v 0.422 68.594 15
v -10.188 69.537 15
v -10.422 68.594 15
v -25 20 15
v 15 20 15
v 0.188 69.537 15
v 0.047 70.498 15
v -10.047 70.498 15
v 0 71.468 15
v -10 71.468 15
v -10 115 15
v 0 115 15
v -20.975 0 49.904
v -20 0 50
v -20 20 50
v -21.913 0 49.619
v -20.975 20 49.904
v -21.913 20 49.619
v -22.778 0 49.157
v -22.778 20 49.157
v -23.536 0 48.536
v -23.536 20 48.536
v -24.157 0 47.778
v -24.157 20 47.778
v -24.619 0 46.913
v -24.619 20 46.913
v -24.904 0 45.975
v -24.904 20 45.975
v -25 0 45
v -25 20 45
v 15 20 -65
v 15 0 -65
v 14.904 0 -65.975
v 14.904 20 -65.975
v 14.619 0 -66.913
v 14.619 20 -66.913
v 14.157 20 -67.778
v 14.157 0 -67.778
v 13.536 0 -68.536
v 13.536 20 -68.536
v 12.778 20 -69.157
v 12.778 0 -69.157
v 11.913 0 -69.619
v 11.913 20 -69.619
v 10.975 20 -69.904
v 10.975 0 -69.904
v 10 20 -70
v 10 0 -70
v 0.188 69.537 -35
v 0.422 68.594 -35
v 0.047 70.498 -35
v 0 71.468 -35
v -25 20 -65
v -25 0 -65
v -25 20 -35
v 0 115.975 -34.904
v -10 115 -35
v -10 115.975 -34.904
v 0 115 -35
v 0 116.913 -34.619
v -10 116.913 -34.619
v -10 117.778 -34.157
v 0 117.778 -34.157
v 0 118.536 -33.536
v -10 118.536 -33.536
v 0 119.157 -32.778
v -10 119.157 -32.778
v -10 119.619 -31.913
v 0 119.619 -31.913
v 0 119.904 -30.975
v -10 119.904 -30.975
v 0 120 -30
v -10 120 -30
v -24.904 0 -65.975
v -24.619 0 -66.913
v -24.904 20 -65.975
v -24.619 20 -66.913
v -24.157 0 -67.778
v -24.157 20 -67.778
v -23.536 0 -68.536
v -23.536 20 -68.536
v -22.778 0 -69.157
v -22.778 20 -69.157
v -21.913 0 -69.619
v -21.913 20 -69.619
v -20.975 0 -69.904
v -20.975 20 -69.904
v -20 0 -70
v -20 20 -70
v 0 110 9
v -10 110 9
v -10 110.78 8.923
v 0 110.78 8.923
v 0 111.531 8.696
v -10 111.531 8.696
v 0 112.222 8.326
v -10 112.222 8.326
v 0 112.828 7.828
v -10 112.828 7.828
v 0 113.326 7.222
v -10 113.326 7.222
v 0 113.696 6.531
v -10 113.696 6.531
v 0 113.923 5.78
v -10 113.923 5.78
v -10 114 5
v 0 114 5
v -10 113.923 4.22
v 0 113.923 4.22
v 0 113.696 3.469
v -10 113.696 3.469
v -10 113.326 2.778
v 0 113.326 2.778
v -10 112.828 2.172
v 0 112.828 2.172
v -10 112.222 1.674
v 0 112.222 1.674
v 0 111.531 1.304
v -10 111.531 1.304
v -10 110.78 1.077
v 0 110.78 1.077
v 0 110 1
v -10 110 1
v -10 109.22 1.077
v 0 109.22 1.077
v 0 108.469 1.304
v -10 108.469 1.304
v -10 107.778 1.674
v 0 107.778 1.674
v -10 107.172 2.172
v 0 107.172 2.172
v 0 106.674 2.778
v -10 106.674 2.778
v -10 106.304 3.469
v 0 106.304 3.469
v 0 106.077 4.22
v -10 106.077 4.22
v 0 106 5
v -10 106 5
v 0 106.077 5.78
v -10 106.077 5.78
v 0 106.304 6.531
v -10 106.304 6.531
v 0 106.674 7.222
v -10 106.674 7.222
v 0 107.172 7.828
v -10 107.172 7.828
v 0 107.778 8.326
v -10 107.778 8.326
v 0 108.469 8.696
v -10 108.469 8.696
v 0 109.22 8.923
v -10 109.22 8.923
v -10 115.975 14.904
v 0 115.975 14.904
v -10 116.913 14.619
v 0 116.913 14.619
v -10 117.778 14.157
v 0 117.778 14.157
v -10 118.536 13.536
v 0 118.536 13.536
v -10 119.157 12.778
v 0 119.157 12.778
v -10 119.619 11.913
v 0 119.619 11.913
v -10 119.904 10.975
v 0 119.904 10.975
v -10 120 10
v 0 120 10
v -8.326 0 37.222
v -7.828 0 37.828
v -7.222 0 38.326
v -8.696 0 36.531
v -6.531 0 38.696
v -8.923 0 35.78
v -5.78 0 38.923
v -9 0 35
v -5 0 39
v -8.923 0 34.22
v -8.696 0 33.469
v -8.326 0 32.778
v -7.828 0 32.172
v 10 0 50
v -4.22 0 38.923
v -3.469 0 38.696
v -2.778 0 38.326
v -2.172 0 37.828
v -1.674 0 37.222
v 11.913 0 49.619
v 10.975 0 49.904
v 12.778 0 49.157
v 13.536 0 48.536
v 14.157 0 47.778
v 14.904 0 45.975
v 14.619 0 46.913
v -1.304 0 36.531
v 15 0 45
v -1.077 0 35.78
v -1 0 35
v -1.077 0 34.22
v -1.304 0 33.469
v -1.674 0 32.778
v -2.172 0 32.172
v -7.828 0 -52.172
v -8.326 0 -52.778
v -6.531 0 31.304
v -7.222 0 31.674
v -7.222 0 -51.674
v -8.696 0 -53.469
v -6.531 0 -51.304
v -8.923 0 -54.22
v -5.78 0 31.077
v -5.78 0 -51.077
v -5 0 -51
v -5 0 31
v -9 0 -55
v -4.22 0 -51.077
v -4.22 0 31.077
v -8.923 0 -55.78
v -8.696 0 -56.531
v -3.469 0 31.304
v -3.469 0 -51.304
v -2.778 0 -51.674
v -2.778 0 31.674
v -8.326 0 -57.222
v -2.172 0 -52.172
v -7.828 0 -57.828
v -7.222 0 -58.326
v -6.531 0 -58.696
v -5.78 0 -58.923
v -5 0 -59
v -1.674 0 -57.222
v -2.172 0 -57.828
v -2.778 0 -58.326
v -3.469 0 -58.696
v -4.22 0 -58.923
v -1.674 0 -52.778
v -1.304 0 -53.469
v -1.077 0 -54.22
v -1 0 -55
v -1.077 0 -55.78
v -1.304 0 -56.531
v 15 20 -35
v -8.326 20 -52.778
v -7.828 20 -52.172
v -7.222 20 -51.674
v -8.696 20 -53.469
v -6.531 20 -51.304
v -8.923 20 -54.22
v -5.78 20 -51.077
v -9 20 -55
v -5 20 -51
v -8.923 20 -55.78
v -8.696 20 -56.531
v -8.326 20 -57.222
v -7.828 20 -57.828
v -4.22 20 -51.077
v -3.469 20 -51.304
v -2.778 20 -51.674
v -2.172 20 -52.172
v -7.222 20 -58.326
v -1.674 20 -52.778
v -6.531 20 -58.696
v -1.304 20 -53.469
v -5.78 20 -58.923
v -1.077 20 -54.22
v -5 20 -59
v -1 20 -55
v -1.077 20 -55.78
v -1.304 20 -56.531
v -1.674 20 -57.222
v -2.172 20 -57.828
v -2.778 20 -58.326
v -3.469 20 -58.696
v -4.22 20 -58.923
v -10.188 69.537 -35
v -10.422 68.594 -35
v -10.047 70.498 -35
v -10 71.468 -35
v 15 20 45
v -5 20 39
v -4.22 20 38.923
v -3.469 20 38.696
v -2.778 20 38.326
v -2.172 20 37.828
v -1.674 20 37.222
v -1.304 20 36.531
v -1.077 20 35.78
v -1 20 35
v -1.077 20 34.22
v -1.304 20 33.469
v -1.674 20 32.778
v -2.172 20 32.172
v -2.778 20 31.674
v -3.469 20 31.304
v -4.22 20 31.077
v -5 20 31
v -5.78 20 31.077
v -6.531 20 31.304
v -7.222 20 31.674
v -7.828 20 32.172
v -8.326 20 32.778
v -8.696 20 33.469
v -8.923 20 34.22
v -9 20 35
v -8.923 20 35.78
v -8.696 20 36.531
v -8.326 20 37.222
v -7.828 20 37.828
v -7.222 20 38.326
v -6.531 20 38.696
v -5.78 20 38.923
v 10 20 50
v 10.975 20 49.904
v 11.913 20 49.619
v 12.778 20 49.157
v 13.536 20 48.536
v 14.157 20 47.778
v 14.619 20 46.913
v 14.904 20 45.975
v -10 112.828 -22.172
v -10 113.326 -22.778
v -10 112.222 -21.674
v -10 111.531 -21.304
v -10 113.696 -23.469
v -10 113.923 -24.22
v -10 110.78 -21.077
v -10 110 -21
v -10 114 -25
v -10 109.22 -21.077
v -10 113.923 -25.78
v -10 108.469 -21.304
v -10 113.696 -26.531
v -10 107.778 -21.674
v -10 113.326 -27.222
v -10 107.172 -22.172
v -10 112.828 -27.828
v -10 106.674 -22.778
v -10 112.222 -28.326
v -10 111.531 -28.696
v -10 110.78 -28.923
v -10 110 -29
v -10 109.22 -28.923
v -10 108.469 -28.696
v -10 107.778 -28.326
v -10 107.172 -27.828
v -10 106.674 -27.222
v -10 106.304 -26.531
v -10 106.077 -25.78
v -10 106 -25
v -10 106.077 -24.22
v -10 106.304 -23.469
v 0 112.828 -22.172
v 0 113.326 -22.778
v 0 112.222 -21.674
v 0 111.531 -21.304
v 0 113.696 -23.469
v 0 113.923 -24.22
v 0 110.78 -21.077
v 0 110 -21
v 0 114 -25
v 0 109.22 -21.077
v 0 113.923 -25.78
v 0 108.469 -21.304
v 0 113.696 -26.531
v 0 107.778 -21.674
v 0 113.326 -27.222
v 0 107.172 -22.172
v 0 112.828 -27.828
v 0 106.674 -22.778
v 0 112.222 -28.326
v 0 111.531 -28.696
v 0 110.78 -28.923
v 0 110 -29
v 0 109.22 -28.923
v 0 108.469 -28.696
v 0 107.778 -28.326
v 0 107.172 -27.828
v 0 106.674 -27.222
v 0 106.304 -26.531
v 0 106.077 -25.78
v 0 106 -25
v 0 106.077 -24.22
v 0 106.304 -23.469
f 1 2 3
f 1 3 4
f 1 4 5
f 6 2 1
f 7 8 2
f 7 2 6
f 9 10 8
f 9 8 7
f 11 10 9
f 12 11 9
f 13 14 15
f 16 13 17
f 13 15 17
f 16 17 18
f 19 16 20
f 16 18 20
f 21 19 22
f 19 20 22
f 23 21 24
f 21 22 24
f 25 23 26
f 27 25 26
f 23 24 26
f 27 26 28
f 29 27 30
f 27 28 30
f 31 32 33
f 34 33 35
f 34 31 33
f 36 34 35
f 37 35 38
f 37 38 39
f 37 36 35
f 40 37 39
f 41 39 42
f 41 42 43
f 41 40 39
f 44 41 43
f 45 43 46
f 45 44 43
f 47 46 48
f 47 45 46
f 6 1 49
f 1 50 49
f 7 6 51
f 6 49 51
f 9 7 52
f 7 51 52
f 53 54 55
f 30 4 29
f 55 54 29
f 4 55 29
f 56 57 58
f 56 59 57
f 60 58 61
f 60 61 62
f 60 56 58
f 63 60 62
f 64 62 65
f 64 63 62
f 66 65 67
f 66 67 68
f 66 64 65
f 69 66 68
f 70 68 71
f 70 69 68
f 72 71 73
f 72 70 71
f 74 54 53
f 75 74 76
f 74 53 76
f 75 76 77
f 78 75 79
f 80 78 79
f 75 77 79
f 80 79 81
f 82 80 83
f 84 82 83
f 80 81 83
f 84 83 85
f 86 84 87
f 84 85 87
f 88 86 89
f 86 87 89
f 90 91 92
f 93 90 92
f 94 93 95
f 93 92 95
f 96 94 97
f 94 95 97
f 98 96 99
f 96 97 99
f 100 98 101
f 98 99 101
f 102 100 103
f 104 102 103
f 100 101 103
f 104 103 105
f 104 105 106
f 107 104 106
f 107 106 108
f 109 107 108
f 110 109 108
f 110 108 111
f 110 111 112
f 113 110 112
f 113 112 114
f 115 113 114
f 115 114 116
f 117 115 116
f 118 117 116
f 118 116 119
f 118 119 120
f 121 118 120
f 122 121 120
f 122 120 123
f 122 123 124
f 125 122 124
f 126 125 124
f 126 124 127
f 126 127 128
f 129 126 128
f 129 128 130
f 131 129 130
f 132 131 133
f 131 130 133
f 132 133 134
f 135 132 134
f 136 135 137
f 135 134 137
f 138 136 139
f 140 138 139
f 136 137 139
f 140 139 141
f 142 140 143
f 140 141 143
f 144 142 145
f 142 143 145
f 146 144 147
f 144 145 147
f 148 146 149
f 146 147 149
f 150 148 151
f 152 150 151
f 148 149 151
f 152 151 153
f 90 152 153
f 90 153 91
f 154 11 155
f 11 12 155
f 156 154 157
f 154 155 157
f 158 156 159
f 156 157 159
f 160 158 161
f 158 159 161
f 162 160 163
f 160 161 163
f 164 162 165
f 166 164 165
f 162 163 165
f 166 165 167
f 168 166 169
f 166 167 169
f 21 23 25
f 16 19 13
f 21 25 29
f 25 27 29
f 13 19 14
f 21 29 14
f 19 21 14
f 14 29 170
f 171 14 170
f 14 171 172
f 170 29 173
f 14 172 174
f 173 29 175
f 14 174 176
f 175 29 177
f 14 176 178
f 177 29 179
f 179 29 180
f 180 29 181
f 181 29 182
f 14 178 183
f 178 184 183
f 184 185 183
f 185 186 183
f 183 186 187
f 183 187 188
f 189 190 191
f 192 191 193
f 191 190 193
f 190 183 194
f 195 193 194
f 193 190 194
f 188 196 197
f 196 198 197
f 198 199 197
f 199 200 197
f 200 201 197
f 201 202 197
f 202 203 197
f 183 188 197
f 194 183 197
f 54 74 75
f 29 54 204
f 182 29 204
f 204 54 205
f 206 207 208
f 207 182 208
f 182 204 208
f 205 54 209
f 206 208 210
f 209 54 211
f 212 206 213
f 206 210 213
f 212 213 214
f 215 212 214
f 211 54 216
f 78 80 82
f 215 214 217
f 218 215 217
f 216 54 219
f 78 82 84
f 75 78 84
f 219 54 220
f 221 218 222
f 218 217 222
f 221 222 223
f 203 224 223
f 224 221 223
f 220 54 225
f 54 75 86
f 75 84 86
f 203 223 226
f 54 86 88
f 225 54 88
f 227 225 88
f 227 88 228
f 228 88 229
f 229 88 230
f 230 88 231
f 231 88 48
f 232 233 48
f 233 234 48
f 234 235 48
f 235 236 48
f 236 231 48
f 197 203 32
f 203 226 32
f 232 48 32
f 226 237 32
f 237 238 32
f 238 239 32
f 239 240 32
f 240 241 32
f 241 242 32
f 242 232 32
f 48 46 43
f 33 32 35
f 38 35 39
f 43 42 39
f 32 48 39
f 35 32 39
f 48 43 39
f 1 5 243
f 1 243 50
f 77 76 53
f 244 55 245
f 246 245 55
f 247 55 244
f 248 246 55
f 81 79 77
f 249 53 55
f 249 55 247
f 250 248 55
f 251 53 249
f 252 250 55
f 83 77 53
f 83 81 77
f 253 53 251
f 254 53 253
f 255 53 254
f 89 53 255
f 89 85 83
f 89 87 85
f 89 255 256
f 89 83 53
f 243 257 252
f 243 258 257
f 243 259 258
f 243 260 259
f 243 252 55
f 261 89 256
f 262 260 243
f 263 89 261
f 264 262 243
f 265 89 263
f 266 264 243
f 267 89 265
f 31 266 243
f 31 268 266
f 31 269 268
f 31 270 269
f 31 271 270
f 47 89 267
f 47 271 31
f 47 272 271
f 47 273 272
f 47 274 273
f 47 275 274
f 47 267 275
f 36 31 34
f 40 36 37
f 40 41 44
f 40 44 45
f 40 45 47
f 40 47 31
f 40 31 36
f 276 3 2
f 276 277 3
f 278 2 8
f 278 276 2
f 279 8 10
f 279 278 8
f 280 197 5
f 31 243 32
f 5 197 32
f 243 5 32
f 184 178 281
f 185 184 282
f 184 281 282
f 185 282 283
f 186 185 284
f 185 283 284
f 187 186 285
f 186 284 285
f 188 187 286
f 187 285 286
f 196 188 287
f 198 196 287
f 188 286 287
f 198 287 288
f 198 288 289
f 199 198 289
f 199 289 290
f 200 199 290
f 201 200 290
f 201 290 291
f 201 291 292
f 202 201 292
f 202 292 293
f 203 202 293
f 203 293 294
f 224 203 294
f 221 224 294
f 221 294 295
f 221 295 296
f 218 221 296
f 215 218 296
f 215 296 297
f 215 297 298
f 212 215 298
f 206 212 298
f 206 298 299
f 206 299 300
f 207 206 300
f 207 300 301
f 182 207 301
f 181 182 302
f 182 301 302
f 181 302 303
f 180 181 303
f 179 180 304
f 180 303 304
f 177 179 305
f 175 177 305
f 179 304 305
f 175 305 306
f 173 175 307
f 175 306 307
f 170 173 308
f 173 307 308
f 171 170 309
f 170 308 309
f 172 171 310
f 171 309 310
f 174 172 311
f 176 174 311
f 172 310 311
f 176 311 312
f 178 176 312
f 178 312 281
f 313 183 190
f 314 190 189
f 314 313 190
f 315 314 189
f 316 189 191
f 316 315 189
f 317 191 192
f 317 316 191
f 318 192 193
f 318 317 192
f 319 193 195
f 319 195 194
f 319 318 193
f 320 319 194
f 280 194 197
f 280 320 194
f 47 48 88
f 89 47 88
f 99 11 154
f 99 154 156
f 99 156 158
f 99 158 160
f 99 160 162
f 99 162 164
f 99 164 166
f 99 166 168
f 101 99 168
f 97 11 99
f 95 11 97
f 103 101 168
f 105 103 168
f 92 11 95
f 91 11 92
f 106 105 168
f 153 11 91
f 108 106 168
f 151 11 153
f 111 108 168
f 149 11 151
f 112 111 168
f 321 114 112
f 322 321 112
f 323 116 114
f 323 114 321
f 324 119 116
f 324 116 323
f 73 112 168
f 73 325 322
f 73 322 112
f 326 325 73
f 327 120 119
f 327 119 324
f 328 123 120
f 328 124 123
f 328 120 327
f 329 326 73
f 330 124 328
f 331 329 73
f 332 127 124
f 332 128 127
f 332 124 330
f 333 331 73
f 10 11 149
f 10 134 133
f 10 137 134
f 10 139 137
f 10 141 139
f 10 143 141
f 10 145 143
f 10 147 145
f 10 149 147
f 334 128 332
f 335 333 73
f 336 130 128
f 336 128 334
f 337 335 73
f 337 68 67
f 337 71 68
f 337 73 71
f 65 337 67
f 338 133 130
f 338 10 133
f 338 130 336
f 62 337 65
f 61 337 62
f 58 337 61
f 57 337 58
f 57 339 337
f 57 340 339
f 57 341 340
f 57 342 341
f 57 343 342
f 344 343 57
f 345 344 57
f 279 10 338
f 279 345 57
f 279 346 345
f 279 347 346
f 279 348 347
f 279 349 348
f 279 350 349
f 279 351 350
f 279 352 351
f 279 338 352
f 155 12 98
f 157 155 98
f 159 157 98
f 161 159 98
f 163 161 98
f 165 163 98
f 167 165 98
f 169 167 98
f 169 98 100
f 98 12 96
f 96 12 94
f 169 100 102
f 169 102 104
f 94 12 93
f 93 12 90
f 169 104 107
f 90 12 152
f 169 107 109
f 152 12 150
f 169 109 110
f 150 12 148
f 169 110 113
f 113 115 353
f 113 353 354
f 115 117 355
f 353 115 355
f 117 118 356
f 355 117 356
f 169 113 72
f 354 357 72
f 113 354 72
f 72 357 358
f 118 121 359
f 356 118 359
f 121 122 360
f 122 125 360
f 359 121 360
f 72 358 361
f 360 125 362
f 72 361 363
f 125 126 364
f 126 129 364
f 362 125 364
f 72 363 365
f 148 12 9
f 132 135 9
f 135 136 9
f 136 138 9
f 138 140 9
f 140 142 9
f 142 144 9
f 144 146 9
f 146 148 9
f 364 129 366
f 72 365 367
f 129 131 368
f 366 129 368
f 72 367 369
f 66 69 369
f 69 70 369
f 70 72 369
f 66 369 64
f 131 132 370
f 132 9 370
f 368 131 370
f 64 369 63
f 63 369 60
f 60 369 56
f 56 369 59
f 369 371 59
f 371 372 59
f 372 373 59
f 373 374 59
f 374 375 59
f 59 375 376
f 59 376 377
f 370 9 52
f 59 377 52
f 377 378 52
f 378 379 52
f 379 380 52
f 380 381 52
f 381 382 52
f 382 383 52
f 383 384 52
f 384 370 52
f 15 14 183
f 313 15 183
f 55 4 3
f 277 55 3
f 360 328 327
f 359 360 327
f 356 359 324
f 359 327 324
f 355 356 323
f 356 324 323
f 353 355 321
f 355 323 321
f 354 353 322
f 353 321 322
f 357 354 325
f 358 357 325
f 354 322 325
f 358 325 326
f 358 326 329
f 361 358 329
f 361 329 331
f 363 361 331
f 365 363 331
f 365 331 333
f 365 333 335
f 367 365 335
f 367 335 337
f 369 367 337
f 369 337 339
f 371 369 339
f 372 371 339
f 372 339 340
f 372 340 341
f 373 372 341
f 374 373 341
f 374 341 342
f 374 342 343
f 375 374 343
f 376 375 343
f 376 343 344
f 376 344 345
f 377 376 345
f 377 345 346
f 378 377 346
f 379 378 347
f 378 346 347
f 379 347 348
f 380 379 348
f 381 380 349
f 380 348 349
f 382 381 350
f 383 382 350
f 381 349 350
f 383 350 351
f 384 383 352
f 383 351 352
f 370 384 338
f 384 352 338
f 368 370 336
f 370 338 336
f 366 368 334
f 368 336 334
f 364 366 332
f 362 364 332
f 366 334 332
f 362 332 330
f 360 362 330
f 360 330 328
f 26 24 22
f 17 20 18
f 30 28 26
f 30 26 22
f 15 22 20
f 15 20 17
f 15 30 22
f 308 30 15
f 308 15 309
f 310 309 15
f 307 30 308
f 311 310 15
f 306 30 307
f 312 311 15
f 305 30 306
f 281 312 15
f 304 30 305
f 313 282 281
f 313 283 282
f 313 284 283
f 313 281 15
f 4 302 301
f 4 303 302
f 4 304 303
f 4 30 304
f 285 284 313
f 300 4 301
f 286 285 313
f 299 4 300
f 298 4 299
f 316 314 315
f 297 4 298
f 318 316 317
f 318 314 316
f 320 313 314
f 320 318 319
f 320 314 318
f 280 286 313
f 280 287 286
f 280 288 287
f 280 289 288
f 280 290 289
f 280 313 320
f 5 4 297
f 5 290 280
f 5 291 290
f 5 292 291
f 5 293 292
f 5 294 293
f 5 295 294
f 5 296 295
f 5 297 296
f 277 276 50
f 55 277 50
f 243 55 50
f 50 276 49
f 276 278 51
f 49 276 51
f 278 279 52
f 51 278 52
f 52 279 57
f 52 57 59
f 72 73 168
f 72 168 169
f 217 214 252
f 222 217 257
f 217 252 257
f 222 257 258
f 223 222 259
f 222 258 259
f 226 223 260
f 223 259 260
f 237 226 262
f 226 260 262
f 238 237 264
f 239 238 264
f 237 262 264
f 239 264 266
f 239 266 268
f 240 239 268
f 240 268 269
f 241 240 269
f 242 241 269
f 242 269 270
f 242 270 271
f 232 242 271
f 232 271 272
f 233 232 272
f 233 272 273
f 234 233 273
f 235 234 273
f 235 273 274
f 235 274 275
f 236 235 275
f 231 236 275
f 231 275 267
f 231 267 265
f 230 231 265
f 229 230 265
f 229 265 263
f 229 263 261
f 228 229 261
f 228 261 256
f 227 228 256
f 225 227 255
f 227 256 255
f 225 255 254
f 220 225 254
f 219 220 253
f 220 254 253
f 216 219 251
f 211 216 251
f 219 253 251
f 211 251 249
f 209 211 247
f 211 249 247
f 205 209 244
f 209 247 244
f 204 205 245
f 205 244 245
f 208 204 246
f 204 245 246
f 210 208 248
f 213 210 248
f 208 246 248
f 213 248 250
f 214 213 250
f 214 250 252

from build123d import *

# Parameters (mm, degrees)
BOSS_EXTRUDE1_DEPTH = 20
SKETCH2_W           = 10
SKETCH2_H           = 50
BOSS_EXTRUDE2_DEPTH = 100
SKETCH4_R           = 4
CUT_EXTRUDE2_DEPTH  = 125.599357944
FILLET1_R           = 5
SKETCH7_R           = 4
CUT_EXTRUDE3_DEPTH  = 142.155942135
BOSS_EXTRUDE3_DEPTH = 50
FILLET2_R           = 10
BOSS_EXTRUDE4_DEPTH = 50
FILLET3_R           = 10


with BuildPart() as part:
    # Sketch1 → Boss-Extrude1 (new body)
    with BuildSketch(Plane(origin=(0, 0, 0), x_dir=(1, 0, 0), z_dir=(0, 1, 0))):
        Polygon((-25, 45), (-25, 30), (-25, -30), (-25, -50), (15, -50), (15, -30), (15, 30), (15, 70), (-25, 70), align=None)
    extrude(amount=BOSS_EXTRUDE1_DEPTH)

    # Sketch2 → Boss-Extrude2 (add)
    with BuildSketch(Plane(origin=(0, 20, 0), x_dir=(1, 0, 0), z_dir=(0, 1, 0))):
        with Locations((-5, 10)):
            Rectangle(SKETCH2_W, SKETCH2_H)
    extrude(amount=BOSS_EXTRUDE2_DEPTH)

    # Sketch4 → Cut-Extrude2 (cut, through all)
    with BuildSketch(Plane(origin=(0, 20, 0), x_dir=(1, 0, 0), z_dir=(0, 1, 0))):
        with Locations(Location((-5, 55, 0), (0, 0, 270))):
            Circle(SKETCH4_R)
        with Locations(Location((-5, -35, 0), (0, 0, 270))):
            Circle(SKETCH4_R)
    extrude(amount=-CUT_EXTRUDE2_DEPTH, mode=Mode.SUBTRACT)

    # Fillet1
    fillet1_edges = [part.edges().sort_by_distance(p)[0] for p in [
        (-25, 10, -70),
        (15, 10, -70),
        (15, 10, 50),
        (-25, 10, 50),
        (-5, 120, 15),
        (-5, 120, -35),
    ]]
    fillet(fillet1_edges, radius=FILLET1_R)

    # Sketch7 → Cut-Extrude3 (cut, through all)
    with BuildSketch(Plane.ZY.offset(10)):
        with Locations((-25, 110)):
            Circle(SKETCH7_R)
        with Locations((5, 110)):
            Circle(SKETCH7_R)
    extrude(amount=-CUT_EXTRUDE3_DEPTH, mode=Mode.SUBTRACT)

    # Sketch9 → Boss-Extrude3 (add)
    with BuildSketch(Plane.XY.offset(15)):
        Polygon((-10, 20), (-25, 20), (-10, 70), align=None)
    extrude(amount=-BOSS_EXTRUDE3_DEPTH)

    # Fillet2
    fillet2_edges = [part.edges().sort_by_distance(p)[0] for p in [
        (-10, 70, -10),
    ]]
    fillet(fillet2_edges, radius=FILLET2_R)

    # Sketch10 → Boss-Extrude4 (add)
    with BuildSketch(Plane.XY.offset(15)):
        Polygon((0, 20), (15, 20), (0, 70), align=None)
    extrude(amount=-BOSS_EXTRUDE4_DEPTH)

    # Fillet3
    fillet3_edges = [part.edges().sort_by_distance(p)[0] for p in [
        (0, 70, -10),
    ]]
    fillet(fillet3_edges, radius=FILLET3_R)


solid = part.part
